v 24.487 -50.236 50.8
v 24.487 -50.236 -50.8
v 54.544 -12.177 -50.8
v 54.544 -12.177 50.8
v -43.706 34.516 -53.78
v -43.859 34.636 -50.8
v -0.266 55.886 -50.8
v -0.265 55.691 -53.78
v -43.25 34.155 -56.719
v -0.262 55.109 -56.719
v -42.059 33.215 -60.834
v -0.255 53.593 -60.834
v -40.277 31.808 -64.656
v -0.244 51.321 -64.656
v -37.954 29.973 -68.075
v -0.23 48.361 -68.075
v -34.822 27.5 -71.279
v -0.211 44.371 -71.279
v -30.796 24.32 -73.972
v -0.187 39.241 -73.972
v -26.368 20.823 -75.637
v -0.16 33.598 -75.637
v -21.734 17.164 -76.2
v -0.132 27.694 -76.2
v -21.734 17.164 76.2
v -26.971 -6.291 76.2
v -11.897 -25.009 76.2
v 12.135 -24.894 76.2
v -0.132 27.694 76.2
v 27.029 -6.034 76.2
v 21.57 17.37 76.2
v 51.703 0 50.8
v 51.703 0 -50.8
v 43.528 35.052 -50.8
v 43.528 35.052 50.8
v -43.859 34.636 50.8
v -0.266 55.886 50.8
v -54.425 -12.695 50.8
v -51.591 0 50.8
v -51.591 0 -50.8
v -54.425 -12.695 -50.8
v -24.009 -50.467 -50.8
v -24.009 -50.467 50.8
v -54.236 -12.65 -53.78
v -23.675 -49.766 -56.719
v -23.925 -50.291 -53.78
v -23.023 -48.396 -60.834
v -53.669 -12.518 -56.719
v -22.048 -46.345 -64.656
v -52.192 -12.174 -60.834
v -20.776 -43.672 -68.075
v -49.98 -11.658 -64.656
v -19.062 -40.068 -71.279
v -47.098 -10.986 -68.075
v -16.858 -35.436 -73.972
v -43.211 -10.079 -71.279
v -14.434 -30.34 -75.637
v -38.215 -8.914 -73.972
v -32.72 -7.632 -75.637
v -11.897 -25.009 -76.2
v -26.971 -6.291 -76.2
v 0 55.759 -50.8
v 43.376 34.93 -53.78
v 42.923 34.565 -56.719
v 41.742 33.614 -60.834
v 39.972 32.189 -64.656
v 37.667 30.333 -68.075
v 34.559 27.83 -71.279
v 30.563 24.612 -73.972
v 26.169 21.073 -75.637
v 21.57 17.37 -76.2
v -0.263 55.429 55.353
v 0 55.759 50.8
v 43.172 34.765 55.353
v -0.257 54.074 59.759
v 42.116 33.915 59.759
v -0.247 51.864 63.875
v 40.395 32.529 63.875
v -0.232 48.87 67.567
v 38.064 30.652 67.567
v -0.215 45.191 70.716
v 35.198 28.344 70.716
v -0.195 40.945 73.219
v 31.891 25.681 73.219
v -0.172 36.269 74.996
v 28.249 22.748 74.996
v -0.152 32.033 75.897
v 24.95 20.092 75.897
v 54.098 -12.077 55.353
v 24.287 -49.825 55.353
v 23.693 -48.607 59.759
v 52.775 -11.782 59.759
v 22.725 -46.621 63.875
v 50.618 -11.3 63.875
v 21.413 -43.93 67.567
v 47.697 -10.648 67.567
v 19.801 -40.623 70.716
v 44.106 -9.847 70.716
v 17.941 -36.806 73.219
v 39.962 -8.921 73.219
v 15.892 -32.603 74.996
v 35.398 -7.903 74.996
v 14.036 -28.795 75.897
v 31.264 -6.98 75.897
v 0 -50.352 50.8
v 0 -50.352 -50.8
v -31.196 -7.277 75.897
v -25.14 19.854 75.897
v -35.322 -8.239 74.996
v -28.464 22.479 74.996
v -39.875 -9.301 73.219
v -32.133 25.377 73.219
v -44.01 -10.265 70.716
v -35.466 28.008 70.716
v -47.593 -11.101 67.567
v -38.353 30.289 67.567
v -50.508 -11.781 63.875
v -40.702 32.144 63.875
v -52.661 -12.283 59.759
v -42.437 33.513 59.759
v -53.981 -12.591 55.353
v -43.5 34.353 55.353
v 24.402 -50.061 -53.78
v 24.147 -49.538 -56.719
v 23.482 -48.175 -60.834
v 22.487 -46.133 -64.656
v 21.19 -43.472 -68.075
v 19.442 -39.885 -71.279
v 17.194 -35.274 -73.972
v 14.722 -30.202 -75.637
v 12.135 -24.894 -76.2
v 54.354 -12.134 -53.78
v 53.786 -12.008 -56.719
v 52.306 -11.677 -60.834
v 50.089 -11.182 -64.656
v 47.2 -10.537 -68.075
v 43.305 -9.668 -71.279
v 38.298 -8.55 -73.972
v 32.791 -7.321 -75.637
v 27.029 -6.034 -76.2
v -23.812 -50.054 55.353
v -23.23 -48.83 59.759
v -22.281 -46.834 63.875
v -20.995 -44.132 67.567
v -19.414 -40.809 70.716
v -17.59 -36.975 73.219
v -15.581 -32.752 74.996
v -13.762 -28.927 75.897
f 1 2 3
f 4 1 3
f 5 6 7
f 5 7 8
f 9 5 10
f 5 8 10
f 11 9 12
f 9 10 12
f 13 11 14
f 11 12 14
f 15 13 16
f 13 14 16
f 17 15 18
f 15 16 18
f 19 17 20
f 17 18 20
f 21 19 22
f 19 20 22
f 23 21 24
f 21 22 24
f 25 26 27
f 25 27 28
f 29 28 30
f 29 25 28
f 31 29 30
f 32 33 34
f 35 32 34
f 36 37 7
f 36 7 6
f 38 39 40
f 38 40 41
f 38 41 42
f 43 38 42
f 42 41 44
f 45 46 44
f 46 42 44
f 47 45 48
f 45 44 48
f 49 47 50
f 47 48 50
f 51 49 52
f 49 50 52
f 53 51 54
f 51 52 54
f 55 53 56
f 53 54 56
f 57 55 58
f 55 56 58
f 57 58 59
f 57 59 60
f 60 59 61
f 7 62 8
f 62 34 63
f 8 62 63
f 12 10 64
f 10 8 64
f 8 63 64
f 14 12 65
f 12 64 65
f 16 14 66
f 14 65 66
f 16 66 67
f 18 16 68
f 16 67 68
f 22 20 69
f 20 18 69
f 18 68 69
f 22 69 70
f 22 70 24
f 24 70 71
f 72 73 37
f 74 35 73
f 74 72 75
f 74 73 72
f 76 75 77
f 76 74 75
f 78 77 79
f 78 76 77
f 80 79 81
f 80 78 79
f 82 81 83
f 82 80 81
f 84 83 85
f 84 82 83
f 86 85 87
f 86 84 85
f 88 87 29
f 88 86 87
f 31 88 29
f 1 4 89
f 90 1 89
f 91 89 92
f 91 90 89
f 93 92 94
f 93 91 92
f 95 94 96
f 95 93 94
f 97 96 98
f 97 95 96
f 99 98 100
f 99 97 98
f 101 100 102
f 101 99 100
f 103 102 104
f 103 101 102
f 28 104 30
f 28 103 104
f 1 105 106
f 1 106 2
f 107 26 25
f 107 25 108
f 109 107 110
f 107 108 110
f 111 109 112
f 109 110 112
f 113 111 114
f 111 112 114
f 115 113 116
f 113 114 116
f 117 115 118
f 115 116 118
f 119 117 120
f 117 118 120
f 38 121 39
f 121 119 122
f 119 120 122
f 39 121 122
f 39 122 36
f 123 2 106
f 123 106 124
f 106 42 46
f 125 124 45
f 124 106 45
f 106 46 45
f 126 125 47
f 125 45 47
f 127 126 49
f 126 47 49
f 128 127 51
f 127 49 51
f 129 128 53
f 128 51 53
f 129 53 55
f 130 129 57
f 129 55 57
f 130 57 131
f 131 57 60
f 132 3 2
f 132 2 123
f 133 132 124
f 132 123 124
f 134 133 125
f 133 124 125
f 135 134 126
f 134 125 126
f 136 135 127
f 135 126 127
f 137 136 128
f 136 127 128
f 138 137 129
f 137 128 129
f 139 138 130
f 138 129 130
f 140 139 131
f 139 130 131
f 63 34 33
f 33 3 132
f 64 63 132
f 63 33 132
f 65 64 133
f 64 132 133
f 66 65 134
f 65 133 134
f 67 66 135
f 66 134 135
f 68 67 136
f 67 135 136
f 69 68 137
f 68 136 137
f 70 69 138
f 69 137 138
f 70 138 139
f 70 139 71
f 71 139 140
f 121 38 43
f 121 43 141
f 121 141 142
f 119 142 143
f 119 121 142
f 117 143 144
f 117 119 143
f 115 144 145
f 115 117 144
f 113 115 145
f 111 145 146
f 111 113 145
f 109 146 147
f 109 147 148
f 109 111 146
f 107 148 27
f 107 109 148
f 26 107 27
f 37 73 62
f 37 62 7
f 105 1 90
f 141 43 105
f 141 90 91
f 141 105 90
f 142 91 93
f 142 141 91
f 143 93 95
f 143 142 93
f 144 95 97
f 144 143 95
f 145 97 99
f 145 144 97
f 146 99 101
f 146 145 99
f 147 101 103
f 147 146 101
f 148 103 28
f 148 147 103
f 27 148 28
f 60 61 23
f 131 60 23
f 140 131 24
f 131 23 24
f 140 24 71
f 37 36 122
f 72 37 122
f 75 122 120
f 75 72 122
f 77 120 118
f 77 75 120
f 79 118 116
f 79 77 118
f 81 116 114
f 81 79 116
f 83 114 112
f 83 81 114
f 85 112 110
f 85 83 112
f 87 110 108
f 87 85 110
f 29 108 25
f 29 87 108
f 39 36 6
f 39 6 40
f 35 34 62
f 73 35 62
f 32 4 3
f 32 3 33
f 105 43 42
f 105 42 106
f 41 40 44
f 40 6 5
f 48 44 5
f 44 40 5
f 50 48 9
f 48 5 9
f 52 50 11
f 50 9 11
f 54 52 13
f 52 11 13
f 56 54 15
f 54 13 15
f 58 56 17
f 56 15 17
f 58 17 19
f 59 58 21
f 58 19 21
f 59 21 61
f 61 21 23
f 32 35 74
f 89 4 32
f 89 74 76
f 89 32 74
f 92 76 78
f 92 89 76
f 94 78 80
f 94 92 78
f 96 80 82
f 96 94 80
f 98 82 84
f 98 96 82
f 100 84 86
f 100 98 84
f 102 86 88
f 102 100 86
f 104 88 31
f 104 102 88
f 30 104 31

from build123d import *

# Parameters (mm, degrees)
F1_DEPTH     = 76.2
F2_T1_DEPTH  = 175.4963381321
F2_T3_DEPTH  = 175.4963381321
F2_T5_DEPTH  = 175.4963381321
F2_T7_DEPTH  = 175.4963381321
F2_T9_DEPTH  = 175.4963381321
F2_T11_DEPTH = 175.4963381321
F2_T13_DEPTH = 175.4963381321


# Not quite as in the source:
# - a fillet or chamfer that OpenCascade refuses, or shapes differently, is made with other operations: its cross-section is extruded or revolved along the edge and cut away or added


with BuildPart() as f1:
    # F0 (on Top) → F1 (new body, symmetric)
    with BuildSketch(Plane.XY):
        Polygon((0, 0), (0, 55.7593321666), (-0.2656214809, 55.8856970104), (-43.8588096269, 34.6364909196), align=None)
        Polygon((0, 0), (43.5275850579, 35.051833392), (0, 55.7593321666), align=None)
        Polygon((51.7034059885, 0), (43.5275850579, 35.051833392), (0, 0), align=None)
        Polygon((24.487211867, -50.2360243261), (54.5436322472, -12.1767756978), (0, 0), align=None)
        Polygon((0, -50.3524106258), (0, 0), (-24.0085784972, -50.4665220087), align=None)
        Polygon((24.487211867, -50.2360243261), (0, 0), (0, -50.3524106258), align=None)
        Polygon((-24.0085784972, -50.4665220087), (0, 0), (-54.4254195672, -12.6946992894), align=None)
        Polygon((-51.5913489447, 0), (0, 0), (-43.8588096269, 34.6364909196), align=None)
        Polygon((-54.4254195672, -12.6946992894), (0, 0), (-51.5913489447, 0), align=None)
        Polygon((0, 0), (54.5436322472, -12.1767756978), (51.7034059885, 0), align=None)
    extrude(amount=F1_DEPTH, both=True)

    # F2: fillet of radius 25.4 on 14 edges, made by hand

    # F2_s2 → F2_t1 (cut)
    with BuildSketch(Plane(origin=(78.8765212158, 38.447829267, 0), x_dir=(0, 0, 1), z_dir=(-0.8988964904, -0.4381610429, 0))):
        with BuildLine():
            ThreePointArc((-50.8, 50.3518418934), (-68.7605122421, 42.9123541355), (-76.2, 24.9518418934))
            Line((-76.2, 24.9518418934), (-76.2, 50.3518418934))
            Line((-76.2, 50.3518418934), (-50.8, 50.3518418934))
        make_face()
        with BuildLine():
            ThreePointArc((50.8, 50.3518418934), (68.7605122421, 42.9123541355), (76.2, 24.9518418934))
            Line((76.2, 24.9518418934), (76.2, 50.3518418934))
            Line((76.2, 50.3518418934), (50.8, 50.3518418934))
        make_face()
    extrude(amount=F2_T1_DEPTH, mode=Mode.SUBTRACT)

    # F2_s4 → F2_t3 (cut)
    with BuildSketch(Plane(origin=(19.1189832306, 85.6399769656, 0), x_dir=(0, 0, 1), z_dir=(-0.217884697, -0.9759745175, 0))):
        with BuildLine():
            ThreePointArc((-50.8, 50.3518418934), (-68.7605122421, 42.9123541355), (-76.2, 24.9518418934))
            Line((-76.2, 24.9518418934), (-76.2, 50.3518418934))
            Line((-76.2, 50.3518418934), (-50.8, 50.3518418934))
        make_face()
        with BuildLine():
            ThreePointArc((76.2, 24.9518418934), (68.7605122421, 42.9123541355), (50.8, 50.3518418934))
            Line((50.8, 50.3518418934), (76.2, 50.3518418934))
            Line((76.2, 50.3518418934), (76.2, 24.9518418934))
        make_face()
    extrude(amount=F2_T3_DEPTH, mode=Mode.SUBTRACT)

    # F2_s6 → F2_t5 (cut)
    with BuildSketch(Plane(origin=(-55.0355390834, 68.343475272, 0), x_dir=(0, 0, 1), z_dir=(0.6271987173, -0.7788592742, 0))):
        with BuildLine():
            ThreePointArc((-50.8, 50.3518418934), (-68.7605122421, 42.9123541355), (-76.2, 24.9518418934))
            Line((-76.2, 24.9518418934), (-76.2, 50.3518418934))
            Line((-76.2, 50.3518418934), (-50.8, 50.3518418934))
        make_face()
        with BuildLine():
            ThreePointArc((50.8, 50.3518418934), (68.7605122421, 42.9123541355), (76.2, 24.9518418934))
            Line((76.2, 24.9518418934), (76.2, 50.3518418934))
            Line((76.2, 50.3518418934), (50.8, 50.3518418934))
        make_face()
    extrude(amount=F2_T5_DEPTH, mode=Mode.SUBTRACT)

    # F2_s8 → F2_t7 (cut)
    with BuildSketch(Plane(origin=(-87.7471779472, -0.4170572543, 0), x_dir=(0, 0, 1), z_dir=(0.999988705, 0.0047528884, 0))):
        with BuildLine():
            ThreePointArc((-50.8, 50.3518418934), (-68.7605122421, 42.9123541355), (-76.2, 24.9518418934))
            Line((-76.2, 24.9518418934), (-76.2, 50.3518418934))
            Line((-76.2, 50.3518418934), (-50.8, 50.3518418934))
        make_face()
        with BuildLine():
            ThreePointArc((50.8, 50.3518418934), (68.7605122421, 42.9123541355), (76.2, 24.9518418934))
            Line((76.2, 24.9518418934), (76.2, 50.3518418934))
            Line((76.2, 50.3518418934), (50.8, 50.3518418934))
        make_face()
    extrude(amount=F2_T7_DEPTH, mode=Mode.SUBTRACT)

    # F2_s10 → F2_t9 (cut)
    with BuildSketch(Plane(origin=(-54.3834021005, -68.8635371617, 0), x_dir=(0, 0, 1), z_dir=(0.6197668017, 0.7847860291, 0))):
        with BuildLine():
            ThreePointArc((-50.8, 50.3518418934), (-68.7605122421, 42.9123541355), (-76.2, 24.9518418934))
            Line((-76.2, 24.9518418934), (-76.2, 50.3518418934))
            Line((-76.2, 50.3518418934), (-50.8, 50.3518418934))
        make_face()
        with BuildLine():
            ThreePointArc((50.8, 50.3518418934), (68.7605122421, 42.9123541355), (76.2, 24.9518418934))
            Line((76.2, 24.9518418934), (76.2, 50.3518418934))
            Line((76.2, 50.3518418934), (50.8, 50.3518418934))
        make_face()
    extrude(amount=F2_T9_DEPTH, mode=Mode.SUBTRACT)

    # F2_s12 → F2_t11 (cut)
    with BuildSketch(Plane(origin=(19.932184747, -85.4543690261, 0), x_dir=(0, 0, 1), z_dir=(-0.2271521441, 0.9738592832, 0))):
        with BuildLine():
            ThreePointArc((-50.8, 50.3518418934), (-68.7605122421, 42.9123541355), (-76.2, 24.9518418934))
            Line((-76.2, 24.9518418934), (-76.2, 50.3518418934))
            Line((-76.2, 50.3518418934), (-50.8, 50.3518418934))
        make_face()
        with BuildLine():
            ThreePointArc((50.8, 50.3518418934), (68.7605122421, 42.9123541355), (76.2, 24.9518418934))
            Line((76.2, 24.9518418934), (76.2, 50.3518418934))
            Line((76.2, 50.3518418934), (50.8, 50.3518418934))
        make_face()
    extrude(amount=F2_T11_DEPTH, mode=Mode.SUBTRACT)

    # F2_s14 → F2_t13 (cut)
    with BuildSketch(Plane(origin=(79.2384299376, -37.6963180625, 0), x_dir=(0, 0, 1), z_dir=(-0.9030208924, 0.4295966339, 0))):
        with BuildLine():
            ThreePointArc((-50.8, 50.3518418934), (-68.7605122421, 42.9123541355), (-76.2, 24.9518418934))
            Line((-76.2, 24.9518418934), (-76.2, 50.3518418934))
            Line((-76.2, 50.3518418934), (-50.8, 50.3518418934))
        make_face()
        with BuildLine():
            ThreePointArc((50.8, 50.3518418934), (68.7605122421, 42.9123541355), (76.2, 24.9518418934))
            Line((76.2, 24.9518418934), (76.2, 50.3518418934))
            Line((76.2, 50.3518418934), (50.8, 50.3518418934))
        make_face()
    extrude(amount=F2_T13_DEPTH, mode=Mode.SUBTRACT)


solid = f1.part
